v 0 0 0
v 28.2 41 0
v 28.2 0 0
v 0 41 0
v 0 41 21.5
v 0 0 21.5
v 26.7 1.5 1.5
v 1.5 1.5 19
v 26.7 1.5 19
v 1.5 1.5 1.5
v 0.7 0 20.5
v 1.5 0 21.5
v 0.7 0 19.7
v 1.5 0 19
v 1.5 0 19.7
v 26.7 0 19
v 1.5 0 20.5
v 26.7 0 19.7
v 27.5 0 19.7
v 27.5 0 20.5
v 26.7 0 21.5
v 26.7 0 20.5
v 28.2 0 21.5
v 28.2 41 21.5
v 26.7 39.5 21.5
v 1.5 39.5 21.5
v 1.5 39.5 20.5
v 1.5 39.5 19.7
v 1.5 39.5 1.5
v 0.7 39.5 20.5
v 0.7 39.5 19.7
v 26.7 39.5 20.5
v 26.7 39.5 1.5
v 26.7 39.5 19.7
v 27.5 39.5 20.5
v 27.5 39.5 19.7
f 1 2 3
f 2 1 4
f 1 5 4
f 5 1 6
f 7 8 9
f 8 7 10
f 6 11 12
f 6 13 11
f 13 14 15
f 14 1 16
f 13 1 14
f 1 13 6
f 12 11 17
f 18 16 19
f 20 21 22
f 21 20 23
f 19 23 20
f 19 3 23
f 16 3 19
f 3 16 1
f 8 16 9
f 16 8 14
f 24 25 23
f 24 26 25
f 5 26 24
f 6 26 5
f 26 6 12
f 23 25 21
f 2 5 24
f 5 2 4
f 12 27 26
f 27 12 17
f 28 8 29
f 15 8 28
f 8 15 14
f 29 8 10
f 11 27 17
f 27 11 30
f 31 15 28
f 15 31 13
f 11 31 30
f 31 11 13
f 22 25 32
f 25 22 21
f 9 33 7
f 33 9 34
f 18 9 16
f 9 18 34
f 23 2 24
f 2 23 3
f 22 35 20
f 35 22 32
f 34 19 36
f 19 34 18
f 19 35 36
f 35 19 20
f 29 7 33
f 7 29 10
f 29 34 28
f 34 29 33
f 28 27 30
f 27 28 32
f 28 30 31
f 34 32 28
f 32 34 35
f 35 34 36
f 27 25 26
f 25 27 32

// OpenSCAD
l=38;
w=25.2;
h=20;
t=1.5;

slot=0.8;
trim=2.5;

module cutout(x,z,len,height)
{
    translate([x+t,-t,z+t]){
        cube([len,3*t,height]);
    }
}

// Bottom
cube([w+2*t,l+2*t,t]);


// Front
translate([0,0,0]){
    rotate([0,0,0]){ 
        difference(){
           cube([w+2*t,t,h+t]);
            
           translate([0,-t,h+t-trim]){
               cube([w*2*t,3*t,trim]);
           }
           //cutout(5,0,15,6);
        }
    }
}

// Back
translate([w+2*t,l+2*t,0]){
    rotate([0,0,180]){
        difference(){
           cube([w+2*t,t,h+t]);
            
            //cutout(0,0,2,2);
        }
    }
}

// Left
translate([0,l+2*t,0]){
    rotate([0,0,-90]){ 
        difference() {
           cube([l+2*t,t,h+t]);
           translate([0,t-slot,h+t-slot-1]){
               cube([l+2*t,slot+.2,slot]);
           }
            //cutout(40,0,25,6);
        }
    }
}

// Right
translate([w+2*t,0,0]){
    rotate([0,0,90]){
        difference(){ 
           cube([l+2*t,t,h+t]);
            
            translate([0,t-slot,h+t-slot-1]){
               cube([l+2*t,slot+0.2,slot]);
           }
            //cutout(5,0,15,6);
            //cutout(35,0,25,6);
            
        }
    }
}
